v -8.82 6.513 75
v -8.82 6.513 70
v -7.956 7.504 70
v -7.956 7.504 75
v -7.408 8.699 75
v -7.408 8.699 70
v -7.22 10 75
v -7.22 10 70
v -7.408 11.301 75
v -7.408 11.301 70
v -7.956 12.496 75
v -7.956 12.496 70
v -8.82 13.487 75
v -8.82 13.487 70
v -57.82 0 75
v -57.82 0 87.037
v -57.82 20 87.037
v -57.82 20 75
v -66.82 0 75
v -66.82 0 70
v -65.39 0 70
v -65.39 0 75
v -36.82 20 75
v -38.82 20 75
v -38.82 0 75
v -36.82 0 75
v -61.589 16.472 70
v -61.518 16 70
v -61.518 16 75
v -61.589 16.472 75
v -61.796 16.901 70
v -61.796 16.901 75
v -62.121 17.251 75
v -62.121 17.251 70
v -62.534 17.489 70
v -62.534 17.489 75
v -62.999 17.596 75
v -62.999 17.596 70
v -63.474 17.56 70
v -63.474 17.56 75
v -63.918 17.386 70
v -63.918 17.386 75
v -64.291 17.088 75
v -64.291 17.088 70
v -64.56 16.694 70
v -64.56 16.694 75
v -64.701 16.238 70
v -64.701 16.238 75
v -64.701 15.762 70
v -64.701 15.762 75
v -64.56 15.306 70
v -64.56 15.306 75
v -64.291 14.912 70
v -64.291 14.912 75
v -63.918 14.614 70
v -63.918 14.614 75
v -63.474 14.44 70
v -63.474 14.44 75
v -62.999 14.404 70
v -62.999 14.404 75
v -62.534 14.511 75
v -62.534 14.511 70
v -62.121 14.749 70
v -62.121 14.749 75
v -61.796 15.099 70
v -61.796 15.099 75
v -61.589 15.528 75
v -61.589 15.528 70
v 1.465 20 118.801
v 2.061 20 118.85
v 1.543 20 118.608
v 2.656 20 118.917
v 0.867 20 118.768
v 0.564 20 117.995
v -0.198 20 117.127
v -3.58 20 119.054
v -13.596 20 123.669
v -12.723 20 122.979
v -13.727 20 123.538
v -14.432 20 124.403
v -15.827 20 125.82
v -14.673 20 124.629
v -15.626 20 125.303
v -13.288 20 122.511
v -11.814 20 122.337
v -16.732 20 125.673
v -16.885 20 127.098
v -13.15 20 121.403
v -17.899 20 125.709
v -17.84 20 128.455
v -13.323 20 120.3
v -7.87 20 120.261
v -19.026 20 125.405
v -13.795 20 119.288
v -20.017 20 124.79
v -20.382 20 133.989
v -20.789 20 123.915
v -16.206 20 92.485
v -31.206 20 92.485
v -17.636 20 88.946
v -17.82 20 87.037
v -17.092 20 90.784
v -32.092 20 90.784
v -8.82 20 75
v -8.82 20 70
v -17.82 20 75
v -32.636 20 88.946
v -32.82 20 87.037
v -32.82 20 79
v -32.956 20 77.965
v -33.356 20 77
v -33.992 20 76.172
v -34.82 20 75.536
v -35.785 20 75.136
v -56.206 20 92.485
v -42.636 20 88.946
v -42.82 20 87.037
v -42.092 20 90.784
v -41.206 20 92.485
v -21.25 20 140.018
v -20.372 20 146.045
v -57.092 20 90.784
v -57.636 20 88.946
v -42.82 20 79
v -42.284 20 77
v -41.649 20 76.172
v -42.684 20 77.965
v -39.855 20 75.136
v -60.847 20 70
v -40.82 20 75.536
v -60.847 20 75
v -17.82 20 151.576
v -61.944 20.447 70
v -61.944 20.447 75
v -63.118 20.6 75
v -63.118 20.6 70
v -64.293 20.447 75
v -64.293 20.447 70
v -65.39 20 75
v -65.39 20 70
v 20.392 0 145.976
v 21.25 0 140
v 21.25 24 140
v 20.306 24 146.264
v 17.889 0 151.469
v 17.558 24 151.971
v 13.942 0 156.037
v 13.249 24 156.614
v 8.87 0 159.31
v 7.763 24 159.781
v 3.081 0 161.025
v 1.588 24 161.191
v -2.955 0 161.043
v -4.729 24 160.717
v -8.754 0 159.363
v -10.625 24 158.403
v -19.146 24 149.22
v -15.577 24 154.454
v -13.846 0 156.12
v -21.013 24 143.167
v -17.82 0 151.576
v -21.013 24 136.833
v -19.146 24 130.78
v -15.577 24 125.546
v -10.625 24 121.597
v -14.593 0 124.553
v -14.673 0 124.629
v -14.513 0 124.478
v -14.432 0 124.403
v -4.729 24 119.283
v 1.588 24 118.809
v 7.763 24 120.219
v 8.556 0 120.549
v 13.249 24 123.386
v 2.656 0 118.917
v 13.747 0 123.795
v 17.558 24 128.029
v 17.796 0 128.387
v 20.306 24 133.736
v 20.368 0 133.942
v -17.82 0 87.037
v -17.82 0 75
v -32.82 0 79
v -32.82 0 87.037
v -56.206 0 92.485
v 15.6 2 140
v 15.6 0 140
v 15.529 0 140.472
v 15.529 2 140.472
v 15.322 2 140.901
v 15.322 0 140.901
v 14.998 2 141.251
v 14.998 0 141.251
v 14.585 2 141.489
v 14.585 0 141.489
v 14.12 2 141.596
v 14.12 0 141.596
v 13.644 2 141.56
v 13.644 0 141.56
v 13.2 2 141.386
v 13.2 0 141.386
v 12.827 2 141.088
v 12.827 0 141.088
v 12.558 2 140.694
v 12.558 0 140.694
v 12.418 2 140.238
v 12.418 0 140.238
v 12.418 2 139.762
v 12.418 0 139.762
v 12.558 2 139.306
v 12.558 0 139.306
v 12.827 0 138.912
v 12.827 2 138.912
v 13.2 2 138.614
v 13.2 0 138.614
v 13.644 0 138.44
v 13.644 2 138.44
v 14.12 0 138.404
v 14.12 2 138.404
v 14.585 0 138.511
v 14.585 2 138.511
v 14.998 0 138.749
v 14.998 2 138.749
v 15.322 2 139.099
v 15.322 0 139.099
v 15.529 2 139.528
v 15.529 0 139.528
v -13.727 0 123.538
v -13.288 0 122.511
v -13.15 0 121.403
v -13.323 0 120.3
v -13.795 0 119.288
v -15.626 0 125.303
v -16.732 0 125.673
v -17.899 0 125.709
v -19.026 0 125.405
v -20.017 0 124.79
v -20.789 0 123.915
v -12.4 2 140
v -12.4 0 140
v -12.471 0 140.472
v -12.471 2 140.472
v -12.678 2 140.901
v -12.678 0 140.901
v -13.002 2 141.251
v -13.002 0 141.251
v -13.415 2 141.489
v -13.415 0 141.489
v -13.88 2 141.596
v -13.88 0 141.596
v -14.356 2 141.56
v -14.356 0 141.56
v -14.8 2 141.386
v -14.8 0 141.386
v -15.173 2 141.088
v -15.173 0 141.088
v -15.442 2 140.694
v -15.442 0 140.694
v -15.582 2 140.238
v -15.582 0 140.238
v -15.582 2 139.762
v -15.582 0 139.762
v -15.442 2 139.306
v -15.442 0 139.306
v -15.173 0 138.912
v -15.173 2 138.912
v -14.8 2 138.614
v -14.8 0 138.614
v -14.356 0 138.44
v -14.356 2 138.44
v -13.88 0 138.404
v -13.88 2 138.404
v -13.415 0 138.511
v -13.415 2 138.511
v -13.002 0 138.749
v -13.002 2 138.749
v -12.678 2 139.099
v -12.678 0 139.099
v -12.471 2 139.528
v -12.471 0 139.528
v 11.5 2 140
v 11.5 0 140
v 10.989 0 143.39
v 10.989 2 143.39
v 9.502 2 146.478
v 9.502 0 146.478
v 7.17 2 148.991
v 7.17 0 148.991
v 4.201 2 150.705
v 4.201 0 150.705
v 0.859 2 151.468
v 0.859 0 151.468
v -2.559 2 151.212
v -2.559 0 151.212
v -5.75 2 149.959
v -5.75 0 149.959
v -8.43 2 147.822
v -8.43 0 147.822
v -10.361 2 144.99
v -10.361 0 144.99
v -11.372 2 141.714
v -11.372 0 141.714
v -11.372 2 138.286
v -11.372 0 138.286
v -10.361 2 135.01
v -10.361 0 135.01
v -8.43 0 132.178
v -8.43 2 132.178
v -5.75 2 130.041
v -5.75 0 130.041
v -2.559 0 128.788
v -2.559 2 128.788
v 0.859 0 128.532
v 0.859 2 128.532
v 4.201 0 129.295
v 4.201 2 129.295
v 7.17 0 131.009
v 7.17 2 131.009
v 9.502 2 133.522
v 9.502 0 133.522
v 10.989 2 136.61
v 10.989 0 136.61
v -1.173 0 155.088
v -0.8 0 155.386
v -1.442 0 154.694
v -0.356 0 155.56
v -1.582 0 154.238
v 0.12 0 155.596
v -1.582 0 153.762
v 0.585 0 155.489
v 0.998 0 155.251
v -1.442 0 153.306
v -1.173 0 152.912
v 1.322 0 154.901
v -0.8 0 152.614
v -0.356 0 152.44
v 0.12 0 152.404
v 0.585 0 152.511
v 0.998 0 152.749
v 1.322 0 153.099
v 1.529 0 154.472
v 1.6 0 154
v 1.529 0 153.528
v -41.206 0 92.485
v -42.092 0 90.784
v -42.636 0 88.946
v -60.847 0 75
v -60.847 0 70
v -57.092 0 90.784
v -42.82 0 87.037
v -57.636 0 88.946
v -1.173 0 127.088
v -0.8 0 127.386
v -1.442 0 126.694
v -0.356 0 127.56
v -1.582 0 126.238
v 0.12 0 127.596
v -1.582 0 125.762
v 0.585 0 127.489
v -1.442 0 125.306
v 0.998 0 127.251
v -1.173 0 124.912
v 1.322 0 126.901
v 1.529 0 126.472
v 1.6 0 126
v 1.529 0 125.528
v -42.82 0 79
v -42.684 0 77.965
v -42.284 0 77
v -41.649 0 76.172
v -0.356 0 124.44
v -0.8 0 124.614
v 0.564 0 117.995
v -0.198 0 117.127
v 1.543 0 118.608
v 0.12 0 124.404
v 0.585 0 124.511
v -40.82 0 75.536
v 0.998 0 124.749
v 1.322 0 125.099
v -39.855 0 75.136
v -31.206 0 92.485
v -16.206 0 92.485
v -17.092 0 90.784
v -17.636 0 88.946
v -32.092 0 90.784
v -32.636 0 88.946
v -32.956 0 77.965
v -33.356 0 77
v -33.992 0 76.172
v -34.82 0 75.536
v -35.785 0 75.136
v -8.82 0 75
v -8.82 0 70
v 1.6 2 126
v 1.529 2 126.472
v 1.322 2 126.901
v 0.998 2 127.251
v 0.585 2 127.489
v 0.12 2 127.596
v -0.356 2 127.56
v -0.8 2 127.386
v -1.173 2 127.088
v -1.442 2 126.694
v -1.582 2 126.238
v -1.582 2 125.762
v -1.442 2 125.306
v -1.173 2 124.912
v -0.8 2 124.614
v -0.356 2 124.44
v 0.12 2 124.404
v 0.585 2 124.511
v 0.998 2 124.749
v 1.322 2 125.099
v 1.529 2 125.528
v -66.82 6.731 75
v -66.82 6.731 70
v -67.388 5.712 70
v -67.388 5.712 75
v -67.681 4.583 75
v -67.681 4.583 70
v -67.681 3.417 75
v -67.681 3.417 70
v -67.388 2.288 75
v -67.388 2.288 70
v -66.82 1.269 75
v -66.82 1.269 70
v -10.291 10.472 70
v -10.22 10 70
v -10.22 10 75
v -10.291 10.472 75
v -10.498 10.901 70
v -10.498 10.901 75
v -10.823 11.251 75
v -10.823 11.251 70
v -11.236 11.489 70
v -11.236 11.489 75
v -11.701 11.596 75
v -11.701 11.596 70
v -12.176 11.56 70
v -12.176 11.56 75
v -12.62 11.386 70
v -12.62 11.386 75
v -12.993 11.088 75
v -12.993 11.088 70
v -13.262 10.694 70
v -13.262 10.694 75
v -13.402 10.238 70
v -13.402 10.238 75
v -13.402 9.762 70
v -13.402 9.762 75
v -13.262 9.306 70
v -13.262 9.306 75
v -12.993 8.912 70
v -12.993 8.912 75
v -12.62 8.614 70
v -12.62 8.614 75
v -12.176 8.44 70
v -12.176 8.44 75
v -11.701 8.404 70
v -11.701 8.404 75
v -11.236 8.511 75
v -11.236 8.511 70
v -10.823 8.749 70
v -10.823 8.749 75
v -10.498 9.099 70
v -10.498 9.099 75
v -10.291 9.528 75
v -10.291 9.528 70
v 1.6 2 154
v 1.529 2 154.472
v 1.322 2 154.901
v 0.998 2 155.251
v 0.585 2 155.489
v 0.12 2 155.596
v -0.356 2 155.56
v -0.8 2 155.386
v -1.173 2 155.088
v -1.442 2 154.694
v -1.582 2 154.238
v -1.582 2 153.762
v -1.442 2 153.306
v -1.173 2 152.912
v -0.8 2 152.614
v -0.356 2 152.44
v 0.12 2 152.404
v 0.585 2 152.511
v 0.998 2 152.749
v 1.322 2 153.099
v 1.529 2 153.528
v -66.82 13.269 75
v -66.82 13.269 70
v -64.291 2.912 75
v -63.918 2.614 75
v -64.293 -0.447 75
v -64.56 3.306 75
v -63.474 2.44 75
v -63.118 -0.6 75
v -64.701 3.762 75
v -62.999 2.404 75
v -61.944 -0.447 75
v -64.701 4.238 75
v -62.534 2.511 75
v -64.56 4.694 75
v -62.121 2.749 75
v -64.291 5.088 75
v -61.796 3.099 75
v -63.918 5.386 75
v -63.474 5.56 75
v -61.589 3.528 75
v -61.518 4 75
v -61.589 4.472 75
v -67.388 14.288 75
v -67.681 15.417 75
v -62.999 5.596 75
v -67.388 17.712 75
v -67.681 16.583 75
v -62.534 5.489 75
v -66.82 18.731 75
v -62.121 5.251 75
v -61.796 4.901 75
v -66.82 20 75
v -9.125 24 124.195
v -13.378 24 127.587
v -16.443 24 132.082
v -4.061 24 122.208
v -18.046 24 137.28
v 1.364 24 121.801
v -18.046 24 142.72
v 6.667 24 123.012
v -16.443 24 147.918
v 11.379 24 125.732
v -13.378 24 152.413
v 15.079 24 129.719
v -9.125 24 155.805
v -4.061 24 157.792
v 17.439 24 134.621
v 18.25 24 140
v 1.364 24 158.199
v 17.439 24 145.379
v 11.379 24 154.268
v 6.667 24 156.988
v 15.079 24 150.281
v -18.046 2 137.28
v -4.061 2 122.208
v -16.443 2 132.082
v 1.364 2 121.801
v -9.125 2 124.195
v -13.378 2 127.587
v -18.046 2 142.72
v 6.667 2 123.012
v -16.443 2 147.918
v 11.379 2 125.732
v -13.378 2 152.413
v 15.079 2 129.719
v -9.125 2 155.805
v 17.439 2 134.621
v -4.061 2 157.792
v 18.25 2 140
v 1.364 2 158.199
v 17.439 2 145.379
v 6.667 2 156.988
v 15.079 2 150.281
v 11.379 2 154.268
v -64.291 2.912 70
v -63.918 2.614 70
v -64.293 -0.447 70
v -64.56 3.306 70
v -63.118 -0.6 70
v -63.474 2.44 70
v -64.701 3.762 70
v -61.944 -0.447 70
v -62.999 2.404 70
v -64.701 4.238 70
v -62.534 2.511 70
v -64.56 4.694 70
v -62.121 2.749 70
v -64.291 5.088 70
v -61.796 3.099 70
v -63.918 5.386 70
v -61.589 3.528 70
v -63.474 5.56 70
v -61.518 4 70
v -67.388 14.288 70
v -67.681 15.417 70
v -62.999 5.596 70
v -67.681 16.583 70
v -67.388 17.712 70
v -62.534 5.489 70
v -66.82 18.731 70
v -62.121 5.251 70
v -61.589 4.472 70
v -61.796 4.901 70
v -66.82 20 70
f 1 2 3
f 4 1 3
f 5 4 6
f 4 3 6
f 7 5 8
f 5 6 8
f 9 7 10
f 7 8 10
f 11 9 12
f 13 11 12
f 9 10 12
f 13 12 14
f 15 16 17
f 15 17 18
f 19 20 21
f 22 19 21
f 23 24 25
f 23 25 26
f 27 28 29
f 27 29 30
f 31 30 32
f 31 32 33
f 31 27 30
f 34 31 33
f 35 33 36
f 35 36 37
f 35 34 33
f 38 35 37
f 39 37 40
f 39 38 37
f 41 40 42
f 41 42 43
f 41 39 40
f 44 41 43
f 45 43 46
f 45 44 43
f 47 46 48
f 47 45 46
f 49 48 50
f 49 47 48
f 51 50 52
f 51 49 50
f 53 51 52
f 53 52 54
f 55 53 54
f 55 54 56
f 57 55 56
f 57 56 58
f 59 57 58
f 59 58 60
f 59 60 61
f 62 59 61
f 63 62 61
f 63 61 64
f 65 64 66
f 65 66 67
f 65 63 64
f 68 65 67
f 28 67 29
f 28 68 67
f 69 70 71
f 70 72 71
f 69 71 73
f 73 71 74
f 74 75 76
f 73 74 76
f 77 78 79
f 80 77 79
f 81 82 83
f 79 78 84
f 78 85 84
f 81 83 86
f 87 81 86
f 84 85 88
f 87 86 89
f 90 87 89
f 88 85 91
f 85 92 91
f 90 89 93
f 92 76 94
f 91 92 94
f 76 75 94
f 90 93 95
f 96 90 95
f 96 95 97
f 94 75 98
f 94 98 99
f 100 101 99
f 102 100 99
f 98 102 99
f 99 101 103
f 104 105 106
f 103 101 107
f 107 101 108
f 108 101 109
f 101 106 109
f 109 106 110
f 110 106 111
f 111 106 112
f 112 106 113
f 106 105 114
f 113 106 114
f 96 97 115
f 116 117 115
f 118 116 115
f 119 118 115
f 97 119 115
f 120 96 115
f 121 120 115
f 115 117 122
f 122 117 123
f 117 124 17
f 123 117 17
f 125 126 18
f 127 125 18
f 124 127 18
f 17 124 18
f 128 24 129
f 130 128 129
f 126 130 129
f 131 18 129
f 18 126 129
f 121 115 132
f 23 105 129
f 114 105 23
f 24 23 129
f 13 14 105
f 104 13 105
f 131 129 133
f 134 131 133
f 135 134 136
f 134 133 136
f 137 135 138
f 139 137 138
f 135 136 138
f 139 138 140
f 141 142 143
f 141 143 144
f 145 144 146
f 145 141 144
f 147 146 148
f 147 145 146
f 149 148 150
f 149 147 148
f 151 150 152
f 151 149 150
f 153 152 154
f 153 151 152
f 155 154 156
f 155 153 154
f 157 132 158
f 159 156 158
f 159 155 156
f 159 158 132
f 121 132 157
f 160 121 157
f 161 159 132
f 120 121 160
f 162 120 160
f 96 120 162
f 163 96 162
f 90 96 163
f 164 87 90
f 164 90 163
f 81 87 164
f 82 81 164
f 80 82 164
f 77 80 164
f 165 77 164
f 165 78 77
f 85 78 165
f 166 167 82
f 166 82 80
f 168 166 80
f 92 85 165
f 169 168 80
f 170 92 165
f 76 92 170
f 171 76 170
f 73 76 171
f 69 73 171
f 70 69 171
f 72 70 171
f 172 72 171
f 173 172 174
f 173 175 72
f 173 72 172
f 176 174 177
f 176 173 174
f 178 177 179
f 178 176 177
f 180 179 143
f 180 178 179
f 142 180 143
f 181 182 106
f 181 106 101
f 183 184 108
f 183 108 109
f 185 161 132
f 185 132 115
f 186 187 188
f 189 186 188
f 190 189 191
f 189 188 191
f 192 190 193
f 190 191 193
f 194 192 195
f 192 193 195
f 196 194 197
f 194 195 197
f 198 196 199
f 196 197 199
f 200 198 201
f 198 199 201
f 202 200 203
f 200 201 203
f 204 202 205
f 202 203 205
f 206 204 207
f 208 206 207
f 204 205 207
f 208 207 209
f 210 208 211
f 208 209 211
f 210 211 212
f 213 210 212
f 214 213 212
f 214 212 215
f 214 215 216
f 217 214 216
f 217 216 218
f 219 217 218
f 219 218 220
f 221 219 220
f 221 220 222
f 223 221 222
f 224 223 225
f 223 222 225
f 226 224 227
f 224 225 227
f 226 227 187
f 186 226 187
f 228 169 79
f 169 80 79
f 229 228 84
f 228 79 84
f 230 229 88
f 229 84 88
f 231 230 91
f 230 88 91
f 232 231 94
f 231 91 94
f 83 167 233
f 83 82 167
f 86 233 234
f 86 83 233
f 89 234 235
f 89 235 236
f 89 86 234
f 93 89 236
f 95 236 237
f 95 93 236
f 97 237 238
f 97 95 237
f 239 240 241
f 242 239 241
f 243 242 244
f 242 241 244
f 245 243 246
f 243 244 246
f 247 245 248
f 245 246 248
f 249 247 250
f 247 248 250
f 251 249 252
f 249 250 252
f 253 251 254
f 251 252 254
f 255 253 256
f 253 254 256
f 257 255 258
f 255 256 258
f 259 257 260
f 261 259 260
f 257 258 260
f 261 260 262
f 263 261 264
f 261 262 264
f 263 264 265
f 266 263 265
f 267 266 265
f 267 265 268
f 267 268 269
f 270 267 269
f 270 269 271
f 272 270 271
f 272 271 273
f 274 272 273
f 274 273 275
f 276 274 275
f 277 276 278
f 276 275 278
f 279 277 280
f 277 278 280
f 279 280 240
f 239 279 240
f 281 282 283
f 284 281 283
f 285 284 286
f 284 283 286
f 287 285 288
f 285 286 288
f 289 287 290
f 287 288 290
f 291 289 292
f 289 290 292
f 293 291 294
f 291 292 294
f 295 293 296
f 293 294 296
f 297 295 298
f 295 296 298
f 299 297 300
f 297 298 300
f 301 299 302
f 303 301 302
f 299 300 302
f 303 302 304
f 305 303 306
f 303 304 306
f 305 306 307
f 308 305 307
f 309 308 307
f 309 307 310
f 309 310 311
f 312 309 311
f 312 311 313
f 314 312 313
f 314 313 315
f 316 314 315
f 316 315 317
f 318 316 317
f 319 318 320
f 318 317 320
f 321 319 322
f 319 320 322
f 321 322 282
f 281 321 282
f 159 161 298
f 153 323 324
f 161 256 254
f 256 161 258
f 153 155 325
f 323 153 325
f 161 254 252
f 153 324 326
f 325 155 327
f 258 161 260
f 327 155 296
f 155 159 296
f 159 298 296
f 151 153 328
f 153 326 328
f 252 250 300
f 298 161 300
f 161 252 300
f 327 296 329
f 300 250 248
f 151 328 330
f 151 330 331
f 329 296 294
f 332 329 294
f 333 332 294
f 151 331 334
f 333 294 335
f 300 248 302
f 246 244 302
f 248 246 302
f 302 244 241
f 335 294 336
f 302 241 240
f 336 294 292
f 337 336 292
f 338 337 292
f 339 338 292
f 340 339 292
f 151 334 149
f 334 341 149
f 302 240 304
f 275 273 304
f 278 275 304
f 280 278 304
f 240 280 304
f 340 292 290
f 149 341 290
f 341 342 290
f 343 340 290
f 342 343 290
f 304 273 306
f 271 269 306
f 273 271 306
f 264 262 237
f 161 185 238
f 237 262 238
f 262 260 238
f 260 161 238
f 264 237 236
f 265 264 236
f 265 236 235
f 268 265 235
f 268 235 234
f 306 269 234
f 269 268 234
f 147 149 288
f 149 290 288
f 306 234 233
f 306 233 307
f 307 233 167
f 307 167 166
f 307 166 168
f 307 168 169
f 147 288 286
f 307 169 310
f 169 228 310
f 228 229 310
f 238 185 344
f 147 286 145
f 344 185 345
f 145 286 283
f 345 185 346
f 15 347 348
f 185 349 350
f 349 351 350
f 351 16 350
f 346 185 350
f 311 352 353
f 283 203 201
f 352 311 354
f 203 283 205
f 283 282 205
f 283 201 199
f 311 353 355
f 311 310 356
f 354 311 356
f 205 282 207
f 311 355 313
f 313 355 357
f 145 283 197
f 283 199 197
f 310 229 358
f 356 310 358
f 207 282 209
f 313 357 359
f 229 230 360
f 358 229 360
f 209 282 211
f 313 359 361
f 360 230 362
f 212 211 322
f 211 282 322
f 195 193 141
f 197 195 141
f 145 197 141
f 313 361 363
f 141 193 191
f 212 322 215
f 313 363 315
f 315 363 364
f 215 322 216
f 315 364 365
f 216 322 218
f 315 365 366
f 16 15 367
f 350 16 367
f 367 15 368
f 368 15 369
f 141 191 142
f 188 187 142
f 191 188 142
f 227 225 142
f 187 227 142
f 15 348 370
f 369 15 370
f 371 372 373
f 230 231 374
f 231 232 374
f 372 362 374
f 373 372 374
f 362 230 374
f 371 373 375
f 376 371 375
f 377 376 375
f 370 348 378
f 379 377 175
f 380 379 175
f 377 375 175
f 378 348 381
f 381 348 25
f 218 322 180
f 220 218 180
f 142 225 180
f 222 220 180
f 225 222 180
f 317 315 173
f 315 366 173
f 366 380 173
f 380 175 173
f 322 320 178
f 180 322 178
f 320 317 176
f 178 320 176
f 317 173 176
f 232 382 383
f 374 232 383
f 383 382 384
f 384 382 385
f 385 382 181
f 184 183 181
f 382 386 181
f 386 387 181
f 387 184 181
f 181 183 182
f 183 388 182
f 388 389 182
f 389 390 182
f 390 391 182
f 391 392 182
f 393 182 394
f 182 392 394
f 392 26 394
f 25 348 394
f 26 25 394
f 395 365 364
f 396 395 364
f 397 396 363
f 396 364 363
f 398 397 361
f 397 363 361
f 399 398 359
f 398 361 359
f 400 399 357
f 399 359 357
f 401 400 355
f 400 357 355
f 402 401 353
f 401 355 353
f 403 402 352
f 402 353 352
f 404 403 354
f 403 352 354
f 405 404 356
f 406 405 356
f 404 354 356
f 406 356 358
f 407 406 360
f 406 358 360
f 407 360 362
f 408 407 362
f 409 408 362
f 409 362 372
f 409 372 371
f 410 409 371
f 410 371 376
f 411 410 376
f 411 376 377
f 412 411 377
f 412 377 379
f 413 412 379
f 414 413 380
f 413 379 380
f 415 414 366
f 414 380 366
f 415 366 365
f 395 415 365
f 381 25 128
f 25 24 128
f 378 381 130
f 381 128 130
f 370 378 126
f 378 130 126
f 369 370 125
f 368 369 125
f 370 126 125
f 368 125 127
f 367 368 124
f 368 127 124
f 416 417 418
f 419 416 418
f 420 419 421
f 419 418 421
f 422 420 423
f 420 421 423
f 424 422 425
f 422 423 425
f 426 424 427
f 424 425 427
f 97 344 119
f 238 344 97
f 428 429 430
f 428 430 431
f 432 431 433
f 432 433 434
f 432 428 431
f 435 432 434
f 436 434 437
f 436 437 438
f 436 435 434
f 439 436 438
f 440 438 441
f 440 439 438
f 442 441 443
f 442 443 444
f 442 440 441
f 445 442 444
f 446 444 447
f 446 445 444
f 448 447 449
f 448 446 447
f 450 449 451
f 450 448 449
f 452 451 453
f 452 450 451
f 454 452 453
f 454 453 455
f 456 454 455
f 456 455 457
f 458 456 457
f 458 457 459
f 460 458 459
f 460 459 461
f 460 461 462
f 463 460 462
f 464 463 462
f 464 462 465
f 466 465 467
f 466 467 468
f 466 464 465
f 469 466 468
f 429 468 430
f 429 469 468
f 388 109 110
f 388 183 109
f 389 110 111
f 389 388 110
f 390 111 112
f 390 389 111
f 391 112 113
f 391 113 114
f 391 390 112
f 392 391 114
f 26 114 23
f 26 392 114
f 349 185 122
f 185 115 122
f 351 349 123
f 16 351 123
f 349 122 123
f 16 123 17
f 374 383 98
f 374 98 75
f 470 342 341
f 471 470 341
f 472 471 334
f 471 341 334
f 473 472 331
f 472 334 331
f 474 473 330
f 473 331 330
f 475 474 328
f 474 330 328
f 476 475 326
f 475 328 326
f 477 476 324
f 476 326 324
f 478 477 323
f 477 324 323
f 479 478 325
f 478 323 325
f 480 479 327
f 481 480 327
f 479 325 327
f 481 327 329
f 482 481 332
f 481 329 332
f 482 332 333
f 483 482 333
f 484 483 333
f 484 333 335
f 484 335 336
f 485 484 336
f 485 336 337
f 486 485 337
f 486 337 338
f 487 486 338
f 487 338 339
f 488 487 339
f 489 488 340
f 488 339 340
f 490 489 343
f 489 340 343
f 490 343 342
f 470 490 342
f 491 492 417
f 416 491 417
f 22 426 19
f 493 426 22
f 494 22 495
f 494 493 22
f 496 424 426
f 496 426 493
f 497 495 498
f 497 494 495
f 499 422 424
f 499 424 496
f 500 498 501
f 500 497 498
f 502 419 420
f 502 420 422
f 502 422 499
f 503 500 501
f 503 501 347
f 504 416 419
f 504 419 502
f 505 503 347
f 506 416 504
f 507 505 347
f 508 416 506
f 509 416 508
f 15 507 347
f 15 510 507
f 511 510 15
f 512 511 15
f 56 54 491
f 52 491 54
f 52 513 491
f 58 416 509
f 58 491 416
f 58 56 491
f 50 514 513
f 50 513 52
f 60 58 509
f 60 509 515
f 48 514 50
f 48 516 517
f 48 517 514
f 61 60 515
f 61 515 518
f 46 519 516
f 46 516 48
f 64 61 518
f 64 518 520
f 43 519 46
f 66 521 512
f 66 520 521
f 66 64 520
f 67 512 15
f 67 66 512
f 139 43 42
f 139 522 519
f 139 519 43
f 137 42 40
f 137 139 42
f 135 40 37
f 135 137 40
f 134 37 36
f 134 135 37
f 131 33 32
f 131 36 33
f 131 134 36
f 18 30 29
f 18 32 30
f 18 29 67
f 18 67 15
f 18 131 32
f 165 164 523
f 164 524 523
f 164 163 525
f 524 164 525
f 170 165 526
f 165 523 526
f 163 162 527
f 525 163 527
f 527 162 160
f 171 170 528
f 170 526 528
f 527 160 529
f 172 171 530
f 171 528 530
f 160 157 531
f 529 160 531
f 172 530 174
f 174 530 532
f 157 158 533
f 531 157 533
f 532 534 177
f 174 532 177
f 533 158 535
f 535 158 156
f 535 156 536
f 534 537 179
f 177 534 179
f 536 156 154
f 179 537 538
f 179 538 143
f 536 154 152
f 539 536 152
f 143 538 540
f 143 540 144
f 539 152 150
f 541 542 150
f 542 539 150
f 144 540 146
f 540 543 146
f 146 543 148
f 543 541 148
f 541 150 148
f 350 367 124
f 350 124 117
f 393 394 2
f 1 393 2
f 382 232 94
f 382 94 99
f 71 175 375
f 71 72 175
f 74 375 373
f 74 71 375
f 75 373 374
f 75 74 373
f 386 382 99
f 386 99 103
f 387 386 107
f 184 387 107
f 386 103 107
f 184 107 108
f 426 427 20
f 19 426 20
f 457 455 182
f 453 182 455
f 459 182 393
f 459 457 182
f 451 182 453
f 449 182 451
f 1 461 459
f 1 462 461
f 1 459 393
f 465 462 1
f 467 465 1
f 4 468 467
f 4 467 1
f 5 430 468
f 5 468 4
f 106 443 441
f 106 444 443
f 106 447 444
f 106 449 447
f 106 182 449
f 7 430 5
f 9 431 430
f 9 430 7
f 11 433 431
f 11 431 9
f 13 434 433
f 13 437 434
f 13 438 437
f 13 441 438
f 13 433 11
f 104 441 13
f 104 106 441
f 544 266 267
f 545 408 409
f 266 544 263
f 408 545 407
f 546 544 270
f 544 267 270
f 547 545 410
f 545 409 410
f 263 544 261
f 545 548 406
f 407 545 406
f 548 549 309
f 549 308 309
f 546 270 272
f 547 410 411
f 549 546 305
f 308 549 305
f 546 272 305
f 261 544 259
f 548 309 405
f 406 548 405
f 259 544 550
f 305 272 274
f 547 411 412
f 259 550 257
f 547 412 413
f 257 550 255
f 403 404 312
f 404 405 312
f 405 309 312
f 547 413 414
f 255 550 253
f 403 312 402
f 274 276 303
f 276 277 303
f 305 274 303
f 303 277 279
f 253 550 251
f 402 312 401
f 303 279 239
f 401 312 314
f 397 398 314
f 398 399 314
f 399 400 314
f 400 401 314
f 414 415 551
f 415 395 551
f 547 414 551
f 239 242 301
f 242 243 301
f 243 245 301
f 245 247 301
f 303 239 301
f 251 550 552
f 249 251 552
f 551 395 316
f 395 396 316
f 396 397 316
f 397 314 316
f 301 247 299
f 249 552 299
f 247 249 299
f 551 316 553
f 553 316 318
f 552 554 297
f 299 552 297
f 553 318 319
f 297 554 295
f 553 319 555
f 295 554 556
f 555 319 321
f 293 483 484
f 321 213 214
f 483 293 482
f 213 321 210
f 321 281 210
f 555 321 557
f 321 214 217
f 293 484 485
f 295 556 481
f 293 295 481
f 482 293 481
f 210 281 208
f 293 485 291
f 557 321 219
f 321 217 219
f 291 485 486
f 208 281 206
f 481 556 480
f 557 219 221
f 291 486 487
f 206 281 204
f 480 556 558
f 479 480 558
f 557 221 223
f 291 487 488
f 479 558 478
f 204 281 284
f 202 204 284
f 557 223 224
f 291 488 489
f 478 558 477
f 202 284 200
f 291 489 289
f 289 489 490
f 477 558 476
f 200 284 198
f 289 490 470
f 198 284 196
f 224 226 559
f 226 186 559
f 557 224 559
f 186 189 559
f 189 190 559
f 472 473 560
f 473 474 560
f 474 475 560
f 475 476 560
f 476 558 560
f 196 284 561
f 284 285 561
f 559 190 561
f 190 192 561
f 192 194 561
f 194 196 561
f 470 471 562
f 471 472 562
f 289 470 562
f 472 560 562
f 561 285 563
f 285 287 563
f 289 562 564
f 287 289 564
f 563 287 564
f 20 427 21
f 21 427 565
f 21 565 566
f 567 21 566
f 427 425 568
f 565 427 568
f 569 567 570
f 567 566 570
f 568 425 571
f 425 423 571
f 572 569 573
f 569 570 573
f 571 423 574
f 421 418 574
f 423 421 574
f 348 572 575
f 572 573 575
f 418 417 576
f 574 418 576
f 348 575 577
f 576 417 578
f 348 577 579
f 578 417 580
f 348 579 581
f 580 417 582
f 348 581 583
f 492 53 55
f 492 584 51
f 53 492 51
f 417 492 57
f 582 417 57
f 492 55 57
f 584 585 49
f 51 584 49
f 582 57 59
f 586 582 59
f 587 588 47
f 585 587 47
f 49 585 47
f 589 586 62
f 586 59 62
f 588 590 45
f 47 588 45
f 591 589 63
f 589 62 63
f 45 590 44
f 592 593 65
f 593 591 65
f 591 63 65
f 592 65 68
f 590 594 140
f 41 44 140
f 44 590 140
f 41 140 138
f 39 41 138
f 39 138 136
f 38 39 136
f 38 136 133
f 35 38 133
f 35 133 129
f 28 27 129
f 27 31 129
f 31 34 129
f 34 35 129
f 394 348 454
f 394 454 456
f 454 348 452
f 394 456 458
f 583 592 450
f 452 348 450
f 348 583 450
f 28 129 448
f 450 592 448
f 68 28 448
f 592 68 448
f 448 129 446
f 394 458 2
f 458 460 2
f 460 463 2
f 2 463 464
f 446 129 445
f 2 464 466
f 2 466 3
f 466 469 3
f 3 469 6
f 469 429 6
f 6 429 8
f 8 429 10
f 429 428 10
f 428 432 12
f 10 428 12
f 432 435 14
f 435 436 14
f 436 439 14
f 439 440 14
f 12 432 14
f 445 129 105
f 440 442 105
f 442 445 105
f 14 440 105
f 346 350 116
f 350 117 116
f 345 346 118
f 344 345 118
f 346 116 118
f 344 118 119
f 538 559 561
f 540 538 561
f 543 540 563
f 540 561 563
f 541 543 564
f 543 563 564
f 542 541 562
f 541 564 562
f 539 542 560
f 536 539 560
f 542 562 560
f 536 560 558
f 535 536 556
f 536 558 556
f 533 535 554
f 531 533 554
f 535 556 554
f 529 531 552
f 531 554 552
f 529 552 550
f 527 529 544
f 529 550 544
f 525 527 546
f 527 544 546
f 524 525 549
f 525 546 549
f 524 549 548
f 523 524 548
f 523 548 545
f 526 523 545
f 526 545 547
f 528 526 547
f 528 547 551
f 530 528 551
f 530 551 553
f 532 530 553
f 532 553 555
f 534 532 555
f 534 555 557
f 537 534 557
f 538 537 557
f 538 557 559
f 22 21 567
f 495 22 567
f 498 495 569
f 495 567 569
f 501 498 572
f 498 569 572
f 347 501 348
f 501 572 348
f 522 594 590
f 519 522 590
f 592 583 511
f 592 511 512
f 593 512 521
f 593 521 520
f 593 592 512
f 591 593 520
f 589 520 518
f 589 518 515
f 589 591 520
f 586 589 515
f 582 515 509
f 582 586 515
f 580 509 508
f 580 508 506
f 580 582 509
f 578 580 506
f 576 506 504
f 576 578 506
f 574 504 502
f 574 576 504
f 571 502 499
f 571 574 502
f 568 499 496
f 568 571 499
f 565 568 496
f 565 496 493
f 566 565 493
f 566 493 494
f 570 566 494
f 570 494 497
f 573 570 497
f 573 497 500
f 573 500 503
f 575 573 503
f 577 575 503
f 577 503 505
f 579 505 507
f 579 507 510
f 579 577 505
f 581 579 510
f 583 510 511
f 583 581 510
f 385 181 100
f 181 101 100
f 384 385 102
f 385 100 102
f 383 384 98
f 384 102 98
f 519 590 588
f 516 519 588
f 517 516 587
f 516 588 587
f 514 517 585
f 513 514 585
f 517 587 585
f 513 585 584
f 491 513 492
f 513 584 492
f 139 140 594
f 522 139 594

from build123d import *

# Parameters (mm, degrees)
SKETCH1_R           = 18.25
SKETCH1_R_2         = 1.6
SKETCH1_R_3         = 11.5
BOSS_EXTRUDE1_DEPTH = 2
SKETCH1_3_R         = 21.25
SKETCH1_3_R_2       = 18.25
BOSS_EXTRUDE2_DEPTH = 24
BOSS_EXTRUDE3_DEPTH = 20
SKETCH3_R           = 1.6
BOSS_EXTRUDE4_DEPTH = 5
FILLET3_R           = 10
FILLET4_R           = 4


with BuildPart() as part:
    # Sketch1 → Boss-Extrude1 (new body)
    with BuildSketch(Plane(origin=(0, 0, 0), x_dir=(1, 0, 0), z_dir=(0, 1, 0))):
        Circle(SKETCH1_R)
        with Locations((-14, 0)):
            Circle(SKETCH1_R_2, mode=Mode.SUBTRACT)
        with Locations((0, -14)):
            Circle(SKETCH1_R_2, mode=Mode.SUBTRACT)
        with Locations((14, 0)):
            Circle(SKETCH1_R_2, mode=Mode.SUBTRACT)
        with Locations((0, 14)):
            Circle(SKETCH1_R_2, mode=Mode.SUBTRACT)
        Circle(SKETCH1_R_3, mode=Mode.SUBTRACT)
    extrude(amount=BOSS_EXTRUDE1_DEPTH)

    # Sketch1<3> → Boss-Extrude2 (add)
    with BuildSketch(Plane(origin=(0, 0, 0), x_dir=(1, 0, 0), z_dir=(0, 1, 0))):
        Circle(SKETCH1_3_R)
        Circle(SKETCH1_3_R_2, mode=Mode.SUBTRACT)
    extrude(amount=BOSS_EXTRUDE2_DEPTH)

    # Sketch2 → Boss-Extrude3 (add)
    with BuildSketch(Plane(origin=(0, 0, 0), x_dir=(1, 0, 0), z_dir=(0, 1, 0))):
        with BuildLine():
            ThreePointArc((-17.839967658, -11.545477642), (-21.249992199, 0.018208346), (-17.820155675, 11.576033506))
            Line((-17.820155675, 11.576033506), (-57.820155675, -50))
            Line((-57.820155675, -50), (-57.820155675, -70))
            Line((-57.820155675, -70), (-42.820155675, -70))
            Line((-42.820155675, -70), (-42.820155675, -50))
            Line((-42.820155675, -50), (-17.839967658, -11.545477642))
        make_face()
        with BuildLine():
            Line((-17.820155675, -50), (0.867447809, -21.232287543))
            ThreePointArc((0.867447809, -21.232287543), (-5.756886716, -20.45533562), (-11.81408432, -17.663236161))
            Line((-11.81408432, -17.663236161), (-32.820155675, -50))
            Line((-32.820155675, -50), (-32.820155675, -70))
            Line((-32.820155675, -70), (-17.820155675, -70))
            Line((-17.820155675, -70), (-17.820155675, -50))
        make_face()
    extrude(amount=BOSS_EXTRUDE3_DEPTH)

    # Sketch3 → Boss-Extrude4 (add)
    with BuildSketch(Plane.XY.offset(70)):
        with BuildLine():
            Line((-65.389940295, 20), (-66.820155675, 20))
            Line((-66.820155675, 20), (-66.820155675, 18.730720476))
            ThreePointArc((-66.820155675, 18.730720476), (-67.718376956, 16), (-66.820155675, 13.269279524))
            Line((-66.820155675, 13.269279524), (-66.820155675, 6.730720476))
            ThreePointArc((-66.820155675, 6.730720476), (-67.718376956, 4), (-66.820155675, 1.269279524))
            Line((-66.820155675, 1.269279524), (-66.820155675, 0))
            Line((-66.820155675, 0), (-65.389940295, 0))
            ThreePointArc((-65.389940295, 0), (-63.118376956, -0.6), (-60.846813618, 0))
            Line((-60.846813618, 0), (-8.820155675, 0))
            Line((-8.820155675, 0), (-8.820155675, 6.512880845))
            ThreePointArc((-8.820155675, 6.512880845), (-7.220155675, 10), (-8.820155675, 13.487119155))
            Line((-8.820155675, 13.487119155), (-8.820155675, 20))
            Line((-8.820155675, 20), (-60.846813618, 20))
            ThreePointArc((-60.846813618, 20), (-63.118376956, 20.6), (-65.389940295, 20))
        make_face()
        with Locations((-63.118376956, 16)):
            Circle(SKETCH3_R, mode=Mode.SUBTRACT)
        with Locations((-63.118376956, 4)):
            Circle(SKETCH3_R, mode=Mode.SUBTRACT)
        with Locations((-11.820155675, 10)):
            Circle(SKETCH3_R, mode=Mode.SUBTRACT)
    extrude(amount=-BOSS_EXTRUDE4_DEPTH)

    # Fillet3
    fillet3_edges = [part.edges().sort_by_distance(p)[0] for p in [
        (-57.820155675, 10, 50),
        (-42.820155675, 10, 50),
        (-32.820155675, 10, 50),
        (-17.820155675, 10, 50),
    ]]
    fillet(fillet3_edges, radius=FILLET3_R)

    # Fillet4
    fillet4_edges = [part.edges().sort_by_distance(p)[0] for p in [
        (-17.839967658, 10, 11.545477642),
        (0.867447809, 10, 21.232287543),
        (-11.81408432, 10, 17.663236161),
        (-42.820155675, 10, 65),
        (-32.820155675, 10, 65),
    ]]
    fillet(fillet4_edges, radius=FILLET4_R)


with BuildPart() as body_2:
    # Mirror1: mirrored copy
    add(part.part.mirror(Plane(origin=(0, 20, 70), x_dir=(1, 0, 0), z_dir=(0, 0, -1))))


solid = body_2.part
